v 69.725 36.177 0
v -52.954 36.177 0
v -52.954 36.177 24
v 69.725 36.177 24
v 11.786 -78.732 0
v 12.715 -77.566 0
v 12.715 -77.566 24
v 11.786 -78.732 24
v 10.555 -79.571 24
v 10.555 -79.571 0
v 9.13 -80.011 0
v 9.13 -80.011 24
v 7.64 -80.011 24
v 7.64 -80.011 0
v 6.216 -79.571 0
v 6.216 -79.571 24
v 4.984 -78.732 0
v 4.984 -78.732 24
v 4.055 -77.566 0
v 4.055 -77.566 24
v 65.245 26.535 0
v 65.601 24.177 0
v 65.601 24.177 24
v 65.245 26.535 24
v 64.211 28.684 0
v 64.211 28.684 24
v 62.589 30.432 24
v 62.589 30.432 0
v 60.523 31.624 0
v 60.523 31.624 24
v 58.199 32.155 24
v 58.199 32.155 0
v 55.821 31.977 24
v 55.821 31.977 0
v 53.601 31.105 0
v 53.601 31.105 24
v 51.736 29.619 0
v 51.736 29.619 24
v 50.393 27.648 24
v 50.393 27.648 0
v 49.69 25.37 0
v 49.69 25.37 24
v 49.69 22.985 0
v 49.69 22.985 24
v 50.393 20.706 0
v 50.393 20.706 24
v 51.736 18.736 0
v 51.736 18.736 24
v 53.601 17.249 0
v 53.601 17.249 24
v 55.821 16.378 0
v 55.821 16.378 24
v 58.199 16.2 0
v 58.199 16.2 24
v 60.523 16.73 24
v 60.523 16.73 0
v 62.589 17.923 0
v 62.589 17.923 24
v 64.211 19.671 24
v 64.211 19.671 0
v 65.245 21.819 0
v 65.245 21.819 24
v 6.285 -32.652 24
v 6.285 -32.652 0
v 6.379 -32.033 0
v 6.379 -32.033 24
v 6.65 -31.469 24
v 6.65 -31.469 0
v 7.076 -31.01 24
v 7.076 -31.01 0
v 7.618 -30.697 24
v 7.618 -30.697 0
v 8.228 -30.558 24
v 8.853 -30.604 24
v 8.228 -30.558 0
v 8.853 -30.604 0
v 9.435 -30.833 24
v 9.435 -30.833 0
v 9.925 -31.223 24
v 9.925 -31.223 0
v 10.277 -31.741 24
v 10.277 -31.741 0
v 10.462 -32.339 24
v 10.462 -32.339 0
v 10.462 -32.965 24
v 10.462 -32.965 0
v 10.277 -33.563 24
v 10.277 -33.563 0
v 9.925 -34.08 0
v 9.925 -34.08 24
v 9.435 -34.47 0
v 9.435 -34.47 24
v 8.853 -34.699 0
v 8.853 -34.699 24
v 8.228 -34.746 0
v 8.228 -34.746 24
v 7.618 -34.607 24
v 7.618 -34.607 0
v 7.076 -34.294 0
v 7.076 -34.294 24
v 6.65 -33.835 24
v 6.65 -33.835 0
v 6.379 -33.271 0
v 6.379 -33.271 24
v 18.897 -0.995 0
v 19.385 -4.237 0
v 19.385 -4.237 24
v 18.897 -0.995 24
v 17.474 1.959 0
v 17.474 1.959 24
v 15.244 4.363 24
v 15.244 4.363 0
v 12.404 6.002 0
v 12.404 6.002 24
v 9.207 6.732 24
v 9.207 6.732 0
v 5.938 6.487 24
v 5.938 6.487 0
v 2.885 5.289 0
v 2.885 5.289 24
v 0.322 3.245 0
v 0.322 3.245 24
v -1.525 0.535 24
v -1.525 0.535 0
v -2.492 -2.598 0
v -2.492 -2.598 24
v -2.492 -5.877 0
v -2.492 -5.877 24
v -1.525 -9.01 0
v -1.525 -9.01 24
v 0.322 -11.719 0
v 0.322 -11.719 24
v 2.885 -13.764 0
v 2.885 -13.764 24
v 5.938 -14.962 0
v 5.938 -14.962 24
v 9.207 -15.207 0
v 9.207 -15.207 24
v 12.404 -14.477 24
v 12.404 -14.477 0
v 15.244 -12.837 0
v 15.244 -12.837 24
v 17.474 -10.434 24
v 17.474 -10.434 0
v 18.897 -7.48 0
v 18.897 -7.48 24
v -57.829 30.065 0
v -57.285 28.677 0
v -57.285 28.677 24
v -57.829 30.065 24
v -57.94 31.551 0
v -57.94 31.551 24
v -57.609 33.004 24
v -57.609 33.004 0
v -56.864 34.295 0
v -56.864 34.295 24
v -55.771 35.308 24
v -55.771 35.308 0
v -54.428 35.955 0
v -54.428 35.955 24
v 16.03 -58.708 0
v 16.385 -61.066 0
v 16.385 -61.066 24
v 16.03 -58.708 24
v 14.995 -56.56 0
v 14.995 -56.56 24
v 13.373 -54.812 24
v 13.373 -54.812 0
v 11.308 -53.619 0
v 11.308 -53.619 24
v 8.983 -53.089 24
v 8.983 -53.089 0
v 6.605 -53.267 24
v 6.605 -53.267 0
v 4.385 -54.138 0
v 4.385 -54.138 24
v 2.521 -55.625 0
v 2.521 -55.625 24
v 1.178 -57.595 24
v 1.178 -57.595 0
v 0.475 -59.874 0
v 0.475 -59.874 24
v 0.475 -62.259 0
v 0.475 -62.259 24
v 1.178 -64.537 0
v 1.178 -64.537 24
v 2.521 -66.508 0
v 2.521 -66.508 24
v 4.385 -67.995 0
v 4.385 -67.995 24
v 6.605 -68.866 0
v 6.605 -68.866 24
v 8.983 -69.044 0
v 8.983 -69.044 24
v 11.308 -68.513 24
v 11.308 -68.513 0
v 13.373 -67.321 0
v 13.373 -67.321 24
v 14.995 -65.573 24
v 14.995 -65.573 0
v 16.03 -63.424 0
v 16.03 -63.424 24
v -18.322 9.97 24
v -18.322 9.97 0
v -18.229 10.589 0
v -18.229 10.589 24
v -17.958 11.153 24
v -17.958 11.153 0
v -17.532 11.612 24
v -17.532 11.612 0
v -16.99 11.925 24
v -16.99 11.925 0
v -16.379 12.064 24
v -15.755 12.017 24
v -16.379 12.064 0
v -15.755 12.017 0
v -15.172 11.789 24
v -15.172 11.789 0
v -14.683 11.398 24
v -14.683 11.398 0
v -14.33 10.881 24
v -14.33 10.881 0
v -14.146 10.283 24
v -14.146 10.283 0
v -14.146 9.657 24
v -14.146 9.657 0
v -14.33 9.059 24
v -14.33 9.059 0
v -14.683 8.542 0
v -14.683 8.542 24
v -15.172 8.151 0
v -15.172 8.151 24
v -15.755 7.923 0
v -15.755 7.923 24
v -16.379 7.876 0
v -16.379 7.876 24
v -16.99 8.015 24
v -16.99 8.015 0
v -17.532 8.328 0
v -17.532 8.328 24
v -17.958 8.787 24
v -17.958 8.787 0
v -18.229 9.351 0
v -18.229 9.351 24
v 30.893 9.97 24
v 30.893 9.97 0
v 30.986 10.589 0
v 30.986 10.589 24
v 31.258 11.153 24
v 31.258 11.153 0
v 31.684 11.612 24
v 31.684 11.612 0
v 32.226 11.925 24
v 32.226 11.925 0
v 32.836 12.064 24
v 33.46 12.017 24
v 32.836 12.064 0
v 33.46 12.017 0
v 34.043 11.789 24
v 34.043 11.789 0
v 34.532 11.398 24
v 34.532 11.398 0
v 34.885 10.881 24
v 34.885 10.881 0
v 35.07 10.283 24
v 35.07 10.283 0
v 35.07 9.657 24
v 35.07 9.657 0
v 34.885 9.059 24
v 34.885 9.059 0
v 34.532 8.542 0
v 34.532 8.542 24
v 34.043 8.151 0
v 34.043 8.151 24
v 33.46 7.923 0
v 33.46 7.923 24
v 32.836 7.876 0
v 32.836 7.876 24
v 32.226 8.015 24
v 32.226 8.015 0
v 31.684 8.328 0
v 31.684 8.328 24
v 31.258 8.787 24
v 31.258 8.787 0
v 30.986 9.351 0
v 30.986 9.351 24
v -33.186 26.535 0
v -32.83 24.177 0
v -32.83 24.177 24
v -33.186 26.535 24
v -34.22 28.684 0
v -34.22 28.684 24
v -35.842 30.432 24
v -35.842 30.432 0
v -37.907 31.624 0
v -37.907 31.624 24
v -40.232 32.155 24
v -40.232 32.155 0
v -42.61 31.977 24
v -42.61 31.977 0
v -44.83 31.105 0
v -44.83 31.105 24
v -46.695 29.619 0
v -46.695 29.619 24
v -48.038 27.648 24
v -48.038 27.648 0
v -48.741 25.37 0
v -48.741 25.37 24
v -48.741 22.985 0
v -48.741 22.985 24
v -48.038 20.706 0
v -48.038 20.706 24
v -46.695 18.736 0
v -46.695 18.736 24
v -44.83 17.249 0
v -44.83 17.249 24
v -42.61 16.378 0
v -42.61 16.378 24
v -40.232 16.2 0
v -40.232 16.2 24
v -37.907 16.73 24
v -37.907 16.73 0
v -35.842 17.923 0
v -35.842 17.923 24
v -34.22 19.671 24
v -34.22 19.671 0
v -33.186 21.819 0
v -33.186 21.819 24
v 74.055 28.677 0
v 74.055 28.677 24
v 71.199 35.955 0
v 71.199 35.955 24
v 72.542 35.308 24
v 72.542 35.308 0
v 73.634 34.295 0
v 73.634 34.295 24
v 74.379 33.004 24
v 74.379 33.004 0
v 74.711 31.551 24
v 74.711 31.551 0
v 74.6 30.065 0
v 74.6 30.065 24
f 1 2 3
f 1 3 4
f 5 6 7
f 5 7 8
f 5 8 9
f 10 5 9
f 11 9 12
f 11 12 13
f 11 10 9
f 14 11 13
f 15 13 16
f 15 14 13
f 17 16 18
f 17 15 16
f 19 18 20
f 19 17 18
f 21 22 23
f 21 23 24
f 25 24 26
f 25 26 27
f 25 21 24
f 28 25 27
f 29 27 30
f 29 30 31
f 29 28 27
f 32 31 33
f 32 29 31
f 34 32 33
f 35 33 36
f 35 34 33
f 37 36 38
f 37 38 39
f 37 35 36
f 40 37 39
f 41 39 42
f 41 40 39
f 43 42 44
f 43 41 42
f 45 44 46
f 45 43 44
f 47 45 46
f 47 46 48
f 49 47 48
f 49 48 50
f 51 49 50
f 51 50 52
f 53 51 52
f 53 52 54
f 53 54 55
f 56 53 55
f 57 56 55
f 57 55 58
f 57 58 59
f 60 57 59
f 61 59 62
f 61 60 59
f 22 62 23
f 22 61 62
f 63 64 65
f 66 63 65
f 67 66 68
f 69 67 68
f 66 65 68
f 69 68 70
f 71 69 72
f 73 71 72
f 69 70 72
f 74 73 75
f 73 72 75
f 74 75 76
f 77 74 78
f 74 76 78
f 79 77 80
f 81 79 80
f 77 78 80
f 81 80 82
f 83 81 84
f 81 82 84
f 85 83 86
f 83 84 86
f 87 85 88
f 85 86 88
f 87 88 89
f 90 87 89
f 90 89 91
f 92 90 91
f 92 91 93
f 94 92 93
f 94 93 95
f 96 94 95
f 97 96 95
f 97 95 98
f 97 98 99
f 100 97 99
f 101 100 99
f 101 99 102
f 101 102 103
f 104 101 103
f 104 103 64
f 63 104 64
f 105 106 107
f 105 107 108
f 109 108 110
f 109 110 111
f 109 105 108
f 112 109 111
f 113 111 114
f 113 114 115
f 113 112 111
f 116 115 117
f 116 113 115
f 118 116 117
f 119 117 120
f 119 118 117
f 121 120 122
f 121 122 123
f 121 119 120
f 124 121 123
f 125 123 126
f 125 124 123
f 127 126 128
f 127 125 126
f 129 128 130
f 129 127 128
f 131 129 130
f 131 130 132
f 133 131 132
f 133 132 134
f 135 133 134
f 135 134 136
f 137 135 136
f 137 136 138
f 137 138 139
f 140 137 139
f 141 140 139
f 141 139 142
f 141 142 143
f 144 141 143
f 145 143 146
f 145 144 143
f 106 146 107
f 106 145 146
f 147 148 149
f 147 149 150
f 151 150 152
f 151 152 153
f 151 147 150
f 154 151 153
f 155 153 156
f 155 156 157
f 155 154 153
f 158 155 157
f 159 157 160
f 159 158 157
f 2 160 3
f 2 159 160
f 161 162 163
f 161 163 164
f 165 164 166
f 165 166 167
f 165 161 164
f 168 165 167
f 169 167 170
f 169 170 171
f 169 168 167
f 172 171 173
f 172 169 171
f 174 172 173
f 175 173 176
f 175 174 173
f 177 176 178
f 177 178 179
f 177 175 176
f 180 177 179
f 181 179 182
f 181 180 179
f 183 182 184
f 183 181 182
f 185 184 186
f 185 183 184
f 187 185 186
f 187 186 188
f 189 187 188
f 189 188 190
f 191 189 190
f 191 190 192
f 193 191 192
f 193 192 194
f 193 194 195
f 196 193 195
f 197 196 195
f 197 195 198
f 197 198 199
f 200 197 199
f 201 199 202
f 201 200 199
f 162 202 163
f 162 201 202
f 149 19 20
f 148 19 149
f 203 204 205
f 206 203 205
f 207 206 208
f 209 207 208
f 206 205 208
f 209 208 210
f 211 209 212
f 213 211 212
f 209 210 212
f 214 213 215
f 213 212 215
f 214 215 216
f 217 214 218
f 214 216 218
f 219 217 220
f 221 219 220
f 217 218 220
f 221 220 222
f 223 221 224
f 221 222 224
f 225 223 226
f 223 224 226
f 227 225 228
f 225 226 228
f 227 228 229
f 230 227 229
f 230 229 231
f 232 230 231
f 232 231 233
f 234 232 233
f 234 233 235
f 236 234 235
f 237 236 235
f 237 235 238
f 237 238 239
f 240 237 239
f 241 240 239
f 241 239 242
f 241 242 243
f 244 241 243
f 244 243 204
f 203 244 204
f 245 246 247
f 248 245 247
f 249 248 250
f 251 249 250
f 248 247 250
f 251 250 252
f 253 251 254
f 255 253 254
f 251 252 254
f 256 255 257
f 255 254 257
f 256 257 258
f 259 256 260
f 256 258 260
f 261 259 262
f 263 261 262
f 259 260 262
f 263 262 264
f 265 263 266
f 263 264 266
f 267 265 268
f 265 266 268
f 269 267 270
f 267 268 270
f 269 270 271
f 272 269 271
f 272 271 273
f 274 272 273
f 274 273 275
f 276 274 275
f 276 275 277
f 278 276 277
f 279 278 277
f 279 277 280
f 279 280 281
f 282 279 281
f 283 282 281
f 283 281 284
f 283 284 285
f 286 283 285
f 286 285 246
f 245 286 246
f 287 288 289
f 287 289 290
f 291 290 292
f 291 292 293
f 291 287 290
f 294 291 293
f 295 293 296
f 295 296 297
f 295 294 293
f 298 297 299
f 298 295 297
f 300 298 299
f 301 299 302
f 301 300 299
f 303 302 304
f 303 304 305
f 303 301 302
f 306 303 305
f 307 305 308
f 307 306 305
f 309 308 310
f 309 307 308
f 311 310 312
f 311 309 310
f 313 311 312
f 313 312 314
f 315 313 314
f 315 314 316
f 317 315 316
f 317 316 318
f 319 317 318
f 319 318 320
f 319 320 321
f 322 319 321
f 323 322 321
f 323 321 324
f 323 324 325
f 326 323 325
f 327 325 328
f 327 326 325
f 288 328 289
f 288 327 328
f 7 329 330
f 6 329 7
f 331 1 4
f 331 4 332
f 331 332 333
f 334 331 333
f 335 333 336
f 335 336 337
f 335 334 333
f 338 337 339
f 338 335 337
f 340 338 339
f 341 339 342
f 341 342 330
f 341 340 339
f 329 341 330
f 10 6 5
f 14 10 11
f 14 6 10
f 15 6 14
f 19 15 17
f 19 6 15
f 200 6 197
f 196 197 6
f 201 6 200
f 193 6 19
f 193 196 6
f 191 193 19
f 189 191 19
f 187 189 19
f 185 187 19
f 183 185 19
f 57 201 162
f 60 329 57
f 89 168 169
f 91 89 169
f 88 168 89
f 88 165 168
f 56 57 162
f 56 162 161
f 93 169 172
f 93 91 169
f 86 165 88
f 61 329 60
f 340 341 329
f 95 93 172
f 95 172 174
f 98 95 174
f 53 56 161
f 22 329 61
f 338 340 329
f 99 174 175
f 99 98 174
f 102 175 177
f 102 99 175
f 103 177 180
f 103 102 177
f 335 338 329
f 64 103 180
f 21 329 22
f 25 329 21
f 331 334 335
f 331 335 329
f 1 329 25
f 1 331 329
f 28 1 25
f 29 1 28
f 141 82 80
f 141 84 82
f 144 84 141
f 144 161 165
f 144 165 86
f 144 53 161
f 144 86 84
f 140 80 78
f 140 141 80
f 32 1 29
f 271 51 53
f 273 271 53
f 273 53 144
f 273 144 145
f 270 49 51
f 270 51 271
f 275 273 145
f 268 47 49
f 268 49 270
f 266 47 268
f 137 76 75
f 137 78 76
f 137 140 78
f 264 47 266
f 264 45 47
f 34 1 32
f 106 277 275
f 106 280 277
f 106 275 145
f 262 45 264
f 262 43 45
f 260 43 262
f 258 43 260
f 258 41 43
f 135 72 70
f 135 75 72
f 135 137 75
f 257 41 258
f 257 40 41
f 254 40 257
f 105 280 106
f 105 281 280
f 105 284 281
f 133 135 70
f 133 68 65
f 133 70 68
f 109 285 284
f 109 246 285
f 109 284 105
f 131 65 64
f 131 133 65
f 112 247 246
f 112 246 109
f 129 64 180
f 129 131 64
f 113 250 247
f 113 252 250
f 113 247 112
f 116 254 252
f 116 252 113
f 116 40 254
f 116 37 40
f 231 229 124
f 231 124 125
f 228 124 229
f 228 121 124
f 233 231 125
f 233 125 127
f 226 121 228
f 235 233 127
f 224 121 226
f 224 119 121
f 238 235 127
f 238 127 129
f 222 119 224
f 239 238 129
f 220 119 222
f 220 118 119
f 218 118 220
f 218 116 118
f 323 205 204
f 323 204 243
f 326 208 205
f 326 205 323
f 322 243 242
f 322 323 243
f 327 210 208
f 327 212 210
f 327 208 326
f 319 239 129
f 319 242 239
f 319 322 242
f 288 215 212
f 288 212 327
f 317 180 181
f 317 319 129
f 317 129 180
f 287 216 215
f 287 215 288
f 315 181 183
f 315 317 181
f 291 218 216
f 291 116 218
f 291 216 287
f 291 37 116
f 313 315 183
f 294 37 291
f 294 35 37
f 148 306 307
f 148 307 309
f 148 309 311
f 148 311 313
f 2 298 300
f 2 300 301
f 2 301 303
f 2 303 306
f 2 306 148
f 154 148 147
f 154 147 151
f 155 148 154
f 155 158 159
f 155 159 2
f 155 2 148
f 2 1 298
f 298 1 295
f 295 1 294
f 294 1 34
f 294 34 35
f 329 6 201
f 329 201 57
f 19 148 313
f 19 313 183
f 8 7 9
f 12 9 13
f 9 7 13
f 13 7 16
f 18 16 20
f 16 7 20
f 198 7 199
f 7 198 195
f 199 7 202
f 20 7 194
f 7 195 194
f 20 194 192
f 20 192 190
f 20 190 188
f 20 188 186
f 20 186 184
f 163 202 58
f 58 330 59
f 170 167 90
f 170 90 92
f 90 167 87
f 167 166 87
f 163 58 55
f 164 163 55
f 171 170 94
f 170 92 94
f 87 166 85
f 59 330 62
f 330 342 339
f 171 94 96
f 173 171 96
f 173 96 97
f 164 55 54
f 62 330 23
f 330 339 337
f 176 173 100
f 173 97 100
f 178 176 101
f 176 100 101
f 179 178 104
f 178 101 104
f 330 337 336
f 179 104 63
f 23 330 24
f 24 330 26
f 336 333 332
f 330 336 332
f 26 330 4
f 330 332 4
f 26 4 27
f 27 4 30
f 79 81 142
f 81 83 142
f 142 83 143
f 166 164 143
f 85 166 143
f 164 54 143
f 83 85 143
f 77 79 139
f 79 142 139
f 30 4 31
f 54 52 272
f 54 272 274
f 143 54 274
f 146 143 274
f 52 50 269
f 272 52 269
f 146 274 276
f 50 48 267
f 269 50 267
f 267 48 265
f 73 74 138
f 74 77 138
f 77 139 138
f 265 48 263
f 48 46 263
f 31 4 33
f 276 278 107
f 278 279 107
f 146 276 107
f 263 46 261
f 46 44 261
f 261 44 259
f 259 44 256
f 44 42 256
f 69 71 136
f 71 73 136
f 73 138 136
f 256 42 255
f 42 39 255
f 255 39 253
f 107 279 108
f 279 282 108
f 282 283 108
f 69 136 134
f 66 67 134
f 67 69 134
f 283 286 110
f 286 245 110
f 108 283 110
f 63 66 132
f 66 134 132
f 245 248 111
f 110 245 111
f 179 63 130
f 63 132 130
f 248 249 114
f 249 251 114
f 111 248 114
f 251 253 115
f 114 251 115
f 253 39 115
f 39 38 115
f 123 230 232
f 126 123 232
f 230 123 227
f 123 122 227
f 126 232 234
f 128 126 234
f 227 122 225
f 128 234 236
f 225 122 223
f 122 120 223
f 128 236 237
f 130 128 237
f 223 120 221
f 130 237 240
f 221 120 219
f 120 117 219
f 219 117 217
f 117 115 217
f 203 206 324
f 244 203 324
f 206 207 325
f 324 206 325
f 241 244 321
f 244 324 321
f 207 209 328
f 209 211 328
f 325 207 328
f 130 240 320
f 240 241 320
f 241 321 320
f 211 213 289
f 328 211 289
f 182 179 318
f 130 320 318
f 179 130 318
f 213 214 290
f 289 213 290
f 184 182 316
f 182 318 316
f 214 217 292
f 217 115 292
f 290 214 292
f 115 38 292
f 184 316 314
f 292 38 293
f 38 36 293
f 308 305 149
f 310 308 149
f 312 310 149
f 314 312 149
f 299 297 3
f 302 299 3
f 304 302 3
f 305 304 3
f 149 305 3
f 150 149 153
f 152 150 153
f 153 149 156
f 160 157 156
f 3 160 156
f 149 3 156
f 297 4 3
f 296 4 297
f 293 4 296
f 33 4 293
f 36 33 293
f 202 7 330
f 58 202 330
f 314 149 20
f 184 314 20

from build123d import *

# Parameters (mm, degrees)
IZIM2_R                              = 8
IZIM2_R_2                            = 11
Y_KSEKLIK_EKSTR_ZYON1_DEPTH          = 24
M4_HELISARMAL_I_IN_Z_VANA_MATKAB_1_D = 4.2


with BuildPart() as part:
    # Çizim2 → Yükseklik-Ekstrüzyon1 (new body)
    with BuildSketch(Plane.XY):
        with BuildLine():
            Line((-52.954462088, 36.177194256), (69.725029836, 36.177194256))
            ThreePointArc((69.725029836, 36.177194256), (74.055156855, 33.677194256), (74.055156855, 28.677194256))
            Line((74.055156855, 28.677194256), (12.715410893, -77.566362274))
            ThreePointArc((12.715410893, -77.566362274), (8.385283874, -80.066362274), (4.055156855, -77.566362274))
            Line((4.055156855, -77.566362274), (-57.284589107, 28.677194256))
            ThreePointArc((-57.284589107, 28.677194256), (-57.284589107, 33.677194256), (-52.954462088, 36.177194256))
        make_face()
        with Locations((57.600674183, 24.177194256)):
            Circle(IZIM2_R, mode=Mode.SUBTRACT)
        with Locations((8.385283874, -61.066362274)):
            Circle(IZIM2_R, mode=Mode.SUBTRACT)
        with Locations((-40.830106435, 24.177194256)):
            Circle(IZIM2_R, mode=Mode.SUBTRACT)
        with Locations((8.385283874, -4.237324587)):
            Circle(IZIM2_R_2, mode=Mode.SUBTRACT)
    extrude(amount=Y_KSEKLIK_EKSTR_ZYON1_DEPTH)

    # M4 Helisarmal için Zıvana matkabı1 (through all)
    with Locations(Plane(origin=(-16.222411281, 9.969934834, 24), x_dir=(1, 0, 0), z_dir=(0, 0, 1))):
        with Locations((0, 0), (49.215390309, 0), (24.607695155, -42.621778265)):
            Hole(M4_HELISARMAL_I_IN_Z_VANA_MATKAB_1_D / 2)


solid = part.part
